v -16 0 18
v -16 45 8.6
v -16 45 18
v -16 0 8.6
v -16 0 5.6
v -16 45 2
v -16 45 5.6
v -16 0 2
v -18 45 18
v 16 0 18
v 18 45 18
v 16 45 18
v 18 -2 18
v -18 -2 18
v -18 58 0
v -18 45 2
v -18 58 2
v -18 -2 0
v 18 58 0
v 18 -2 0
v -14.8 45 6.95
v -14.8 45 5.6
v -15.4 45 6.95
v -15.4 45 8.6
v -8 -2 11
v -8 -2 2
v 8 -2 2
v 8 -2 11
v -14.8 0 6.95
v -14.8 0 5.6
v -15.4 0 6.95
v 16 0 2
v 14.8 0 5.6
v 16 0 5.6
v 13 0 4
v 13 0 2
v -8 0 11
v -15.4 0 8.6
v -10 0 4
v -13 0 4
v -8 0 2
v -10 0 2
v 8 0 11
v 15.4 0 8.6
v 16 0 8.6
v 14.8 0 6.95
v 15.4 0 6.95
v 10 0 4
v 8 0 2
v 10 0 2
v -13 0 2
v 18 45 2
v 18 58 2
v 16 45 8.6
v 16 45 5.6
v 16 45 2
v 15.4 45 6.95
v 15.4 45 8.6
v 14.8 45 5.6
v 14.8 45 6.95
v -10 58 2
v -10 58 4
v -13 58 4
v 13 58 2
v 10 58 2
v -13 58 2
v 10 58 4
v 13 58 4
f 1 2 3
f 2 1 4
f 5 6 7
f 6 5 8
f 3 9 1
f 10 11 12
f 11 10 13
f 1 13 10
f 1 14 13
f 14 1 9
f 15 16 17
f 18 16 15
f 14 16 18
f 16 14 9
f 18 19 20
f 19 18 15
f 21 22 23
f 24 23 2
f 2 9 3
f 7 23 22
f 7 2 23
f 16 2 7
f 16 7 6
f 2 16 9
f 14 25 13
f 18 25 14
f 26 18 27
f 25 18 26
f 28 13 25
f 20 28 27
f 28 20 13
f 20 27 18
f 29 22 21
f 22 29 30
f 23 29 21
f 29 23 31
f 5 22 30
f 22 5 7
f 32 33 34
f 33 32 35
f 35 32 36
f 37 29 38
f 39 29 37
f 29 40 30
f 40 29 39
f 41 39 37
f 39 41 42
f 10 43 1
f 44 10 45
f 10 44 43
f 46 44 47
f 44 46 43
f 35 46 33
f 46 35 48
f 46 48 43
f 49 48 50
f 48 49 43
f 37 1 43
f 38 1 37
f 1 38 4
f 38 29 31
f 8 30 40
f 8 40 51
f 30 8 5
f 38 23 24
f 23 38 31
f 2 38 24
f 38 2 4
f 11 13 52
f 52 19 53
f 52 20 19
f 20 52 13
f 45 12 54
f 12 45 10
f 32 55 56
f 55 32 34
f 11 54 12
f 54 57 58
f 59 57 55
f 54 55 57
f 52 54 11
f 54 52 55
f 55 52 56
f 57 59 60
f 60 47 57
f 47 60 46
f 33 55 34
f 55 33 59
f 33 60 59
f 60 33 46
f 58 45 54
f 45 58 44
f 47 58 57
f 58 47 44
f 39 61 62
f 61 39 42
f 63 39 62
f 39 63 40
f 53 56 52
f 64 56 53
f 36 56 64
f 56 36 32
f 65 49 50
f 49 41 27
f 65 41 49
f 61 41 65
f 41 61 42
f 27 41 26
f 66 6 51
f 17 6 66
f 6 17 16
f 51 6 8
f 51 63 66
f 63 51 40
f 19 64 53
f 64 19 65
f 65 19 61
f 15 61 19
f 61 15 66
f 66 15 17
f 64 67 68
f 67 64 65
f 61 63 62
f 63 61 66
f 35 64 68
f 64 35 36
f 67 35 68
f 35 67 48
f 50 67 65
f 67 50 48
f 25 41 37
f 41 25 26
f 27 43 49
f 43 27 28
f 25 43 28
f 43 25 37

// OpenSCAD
// Parametric enclosure for ESP8266 dev boards (NodeMCU / D1 mini class).
// Same geometry as esp8266-enclosure.py; edit the numbers, render, print.
//
//   board_w = width across the two header rows
//   board_l = length from the USB end to the antenna end
//
// The board drops in from the top, the side ribs catch the header strips,
// the end wall leaves a slot for the USB plug, and the antenna end is left
// open so nothing sits next to the radio.

board_w      = 30;    // mm
board_l      = 58;    // mm
pcb_t        = 1.6;
wall         = 2;
floor_t      = 2;
side_clear   = 1;
wall_h       = 18;
antenna_open = 13;
rail_h       = 2;
rail_w       = 3;
rail_inset   = 2;
rib_h        = 3;
rib_interference = 0.2;
usb_cut_w    = 16;
usb_slot_h   = 9;
vent_count   = 4;
vent_w       = 2;
vent_h       = 6;
vent_z       = 9;
vent_start   = 8;
vent_pitch   = 6;

half      = board_w / 2;
in_half   = half + side_clear;
out_half  = in_half + wall;
side_end  = board_l - antenna_open;
rail_top  = floor_t + rail_h;
pcb_top   = rail_top + pcb_t;
slot_top  = floor_t + usb_slot_h;

module side_wall(s) {
    wall_x = [s * in_half, s * out_half];
    translate([min(wall_x), -wall, 0])
        cube([abs(wall_x[1] - wall_x[0]), side_end + wall, wall_h - floor_t]);
    for (i = [0 : vent_count - 1])
        translate([min(wall_x), vent_start + i * vent_pitch, vent_z])
            cube([abs(wall_x[1] - wall_x[0]), vent_w, wall_h - vent_z]);
    translate([min(wall_x), -wall, vent_z + vent_h])
        cube([abs(wall_x[1] - wall_x[0]), side_end + wall, wall_h - vent_z - vent_h]);
    translate([min(wall_x), -wall, floor_t])
        cube([abs(wall_x[1] - wall_x[0]), side_end + wall, vent_z - floor_t]);
}

module rail(s) {
    x0 = s * (half - rail_inset);
    x1 = s * (half - rail_inset - rail_w);
    translate([min(x0, x1), 0, floor_t])
        cube([rail_w, board_l, rail_h]);
}

module rib(s) {
    x_out = s * in_half;
    x_in  = s * (in_half - side_clear - rib_interference);
    x_in2 = s * (in_half - side_clear - rib_interference + 0.6);
    translate([min(x_out, x_in), 0, pcb_top])
        cube([abs(x_out - x_in), side_end, rib_h * 0.45]);
    translate([min(x_out, x_in2), 0, pcb_top + rib_h * 0.45])
        cube([abs(x_out - x_in2), side_end, rib_h * 0.55]);
}

module enclosure() {
    translate([-out_half, -wall, 0])
        cube([out_half * 2, board_l + wall, floor_t]);
    for (s = [-1, 1]) {
        side_wall(s);
        rail(s);
        rib(s);
    }
    translate([-in_half, -wall, floor_t])
        cube([in_half - usb_cut_w / 2, wall, wall_h - floor_t]);
    translate([usb_cut_w / 2, -wall, floor_t])
        cube([in_half - usb_cut_w / 2, wall, wall_h - floor_t]);
    translate([-usb_cut_w / 2, -wall, slot_top])
        cube([usb_cut_w, wall, wall_h - slot_top]);
}

enclosure();
